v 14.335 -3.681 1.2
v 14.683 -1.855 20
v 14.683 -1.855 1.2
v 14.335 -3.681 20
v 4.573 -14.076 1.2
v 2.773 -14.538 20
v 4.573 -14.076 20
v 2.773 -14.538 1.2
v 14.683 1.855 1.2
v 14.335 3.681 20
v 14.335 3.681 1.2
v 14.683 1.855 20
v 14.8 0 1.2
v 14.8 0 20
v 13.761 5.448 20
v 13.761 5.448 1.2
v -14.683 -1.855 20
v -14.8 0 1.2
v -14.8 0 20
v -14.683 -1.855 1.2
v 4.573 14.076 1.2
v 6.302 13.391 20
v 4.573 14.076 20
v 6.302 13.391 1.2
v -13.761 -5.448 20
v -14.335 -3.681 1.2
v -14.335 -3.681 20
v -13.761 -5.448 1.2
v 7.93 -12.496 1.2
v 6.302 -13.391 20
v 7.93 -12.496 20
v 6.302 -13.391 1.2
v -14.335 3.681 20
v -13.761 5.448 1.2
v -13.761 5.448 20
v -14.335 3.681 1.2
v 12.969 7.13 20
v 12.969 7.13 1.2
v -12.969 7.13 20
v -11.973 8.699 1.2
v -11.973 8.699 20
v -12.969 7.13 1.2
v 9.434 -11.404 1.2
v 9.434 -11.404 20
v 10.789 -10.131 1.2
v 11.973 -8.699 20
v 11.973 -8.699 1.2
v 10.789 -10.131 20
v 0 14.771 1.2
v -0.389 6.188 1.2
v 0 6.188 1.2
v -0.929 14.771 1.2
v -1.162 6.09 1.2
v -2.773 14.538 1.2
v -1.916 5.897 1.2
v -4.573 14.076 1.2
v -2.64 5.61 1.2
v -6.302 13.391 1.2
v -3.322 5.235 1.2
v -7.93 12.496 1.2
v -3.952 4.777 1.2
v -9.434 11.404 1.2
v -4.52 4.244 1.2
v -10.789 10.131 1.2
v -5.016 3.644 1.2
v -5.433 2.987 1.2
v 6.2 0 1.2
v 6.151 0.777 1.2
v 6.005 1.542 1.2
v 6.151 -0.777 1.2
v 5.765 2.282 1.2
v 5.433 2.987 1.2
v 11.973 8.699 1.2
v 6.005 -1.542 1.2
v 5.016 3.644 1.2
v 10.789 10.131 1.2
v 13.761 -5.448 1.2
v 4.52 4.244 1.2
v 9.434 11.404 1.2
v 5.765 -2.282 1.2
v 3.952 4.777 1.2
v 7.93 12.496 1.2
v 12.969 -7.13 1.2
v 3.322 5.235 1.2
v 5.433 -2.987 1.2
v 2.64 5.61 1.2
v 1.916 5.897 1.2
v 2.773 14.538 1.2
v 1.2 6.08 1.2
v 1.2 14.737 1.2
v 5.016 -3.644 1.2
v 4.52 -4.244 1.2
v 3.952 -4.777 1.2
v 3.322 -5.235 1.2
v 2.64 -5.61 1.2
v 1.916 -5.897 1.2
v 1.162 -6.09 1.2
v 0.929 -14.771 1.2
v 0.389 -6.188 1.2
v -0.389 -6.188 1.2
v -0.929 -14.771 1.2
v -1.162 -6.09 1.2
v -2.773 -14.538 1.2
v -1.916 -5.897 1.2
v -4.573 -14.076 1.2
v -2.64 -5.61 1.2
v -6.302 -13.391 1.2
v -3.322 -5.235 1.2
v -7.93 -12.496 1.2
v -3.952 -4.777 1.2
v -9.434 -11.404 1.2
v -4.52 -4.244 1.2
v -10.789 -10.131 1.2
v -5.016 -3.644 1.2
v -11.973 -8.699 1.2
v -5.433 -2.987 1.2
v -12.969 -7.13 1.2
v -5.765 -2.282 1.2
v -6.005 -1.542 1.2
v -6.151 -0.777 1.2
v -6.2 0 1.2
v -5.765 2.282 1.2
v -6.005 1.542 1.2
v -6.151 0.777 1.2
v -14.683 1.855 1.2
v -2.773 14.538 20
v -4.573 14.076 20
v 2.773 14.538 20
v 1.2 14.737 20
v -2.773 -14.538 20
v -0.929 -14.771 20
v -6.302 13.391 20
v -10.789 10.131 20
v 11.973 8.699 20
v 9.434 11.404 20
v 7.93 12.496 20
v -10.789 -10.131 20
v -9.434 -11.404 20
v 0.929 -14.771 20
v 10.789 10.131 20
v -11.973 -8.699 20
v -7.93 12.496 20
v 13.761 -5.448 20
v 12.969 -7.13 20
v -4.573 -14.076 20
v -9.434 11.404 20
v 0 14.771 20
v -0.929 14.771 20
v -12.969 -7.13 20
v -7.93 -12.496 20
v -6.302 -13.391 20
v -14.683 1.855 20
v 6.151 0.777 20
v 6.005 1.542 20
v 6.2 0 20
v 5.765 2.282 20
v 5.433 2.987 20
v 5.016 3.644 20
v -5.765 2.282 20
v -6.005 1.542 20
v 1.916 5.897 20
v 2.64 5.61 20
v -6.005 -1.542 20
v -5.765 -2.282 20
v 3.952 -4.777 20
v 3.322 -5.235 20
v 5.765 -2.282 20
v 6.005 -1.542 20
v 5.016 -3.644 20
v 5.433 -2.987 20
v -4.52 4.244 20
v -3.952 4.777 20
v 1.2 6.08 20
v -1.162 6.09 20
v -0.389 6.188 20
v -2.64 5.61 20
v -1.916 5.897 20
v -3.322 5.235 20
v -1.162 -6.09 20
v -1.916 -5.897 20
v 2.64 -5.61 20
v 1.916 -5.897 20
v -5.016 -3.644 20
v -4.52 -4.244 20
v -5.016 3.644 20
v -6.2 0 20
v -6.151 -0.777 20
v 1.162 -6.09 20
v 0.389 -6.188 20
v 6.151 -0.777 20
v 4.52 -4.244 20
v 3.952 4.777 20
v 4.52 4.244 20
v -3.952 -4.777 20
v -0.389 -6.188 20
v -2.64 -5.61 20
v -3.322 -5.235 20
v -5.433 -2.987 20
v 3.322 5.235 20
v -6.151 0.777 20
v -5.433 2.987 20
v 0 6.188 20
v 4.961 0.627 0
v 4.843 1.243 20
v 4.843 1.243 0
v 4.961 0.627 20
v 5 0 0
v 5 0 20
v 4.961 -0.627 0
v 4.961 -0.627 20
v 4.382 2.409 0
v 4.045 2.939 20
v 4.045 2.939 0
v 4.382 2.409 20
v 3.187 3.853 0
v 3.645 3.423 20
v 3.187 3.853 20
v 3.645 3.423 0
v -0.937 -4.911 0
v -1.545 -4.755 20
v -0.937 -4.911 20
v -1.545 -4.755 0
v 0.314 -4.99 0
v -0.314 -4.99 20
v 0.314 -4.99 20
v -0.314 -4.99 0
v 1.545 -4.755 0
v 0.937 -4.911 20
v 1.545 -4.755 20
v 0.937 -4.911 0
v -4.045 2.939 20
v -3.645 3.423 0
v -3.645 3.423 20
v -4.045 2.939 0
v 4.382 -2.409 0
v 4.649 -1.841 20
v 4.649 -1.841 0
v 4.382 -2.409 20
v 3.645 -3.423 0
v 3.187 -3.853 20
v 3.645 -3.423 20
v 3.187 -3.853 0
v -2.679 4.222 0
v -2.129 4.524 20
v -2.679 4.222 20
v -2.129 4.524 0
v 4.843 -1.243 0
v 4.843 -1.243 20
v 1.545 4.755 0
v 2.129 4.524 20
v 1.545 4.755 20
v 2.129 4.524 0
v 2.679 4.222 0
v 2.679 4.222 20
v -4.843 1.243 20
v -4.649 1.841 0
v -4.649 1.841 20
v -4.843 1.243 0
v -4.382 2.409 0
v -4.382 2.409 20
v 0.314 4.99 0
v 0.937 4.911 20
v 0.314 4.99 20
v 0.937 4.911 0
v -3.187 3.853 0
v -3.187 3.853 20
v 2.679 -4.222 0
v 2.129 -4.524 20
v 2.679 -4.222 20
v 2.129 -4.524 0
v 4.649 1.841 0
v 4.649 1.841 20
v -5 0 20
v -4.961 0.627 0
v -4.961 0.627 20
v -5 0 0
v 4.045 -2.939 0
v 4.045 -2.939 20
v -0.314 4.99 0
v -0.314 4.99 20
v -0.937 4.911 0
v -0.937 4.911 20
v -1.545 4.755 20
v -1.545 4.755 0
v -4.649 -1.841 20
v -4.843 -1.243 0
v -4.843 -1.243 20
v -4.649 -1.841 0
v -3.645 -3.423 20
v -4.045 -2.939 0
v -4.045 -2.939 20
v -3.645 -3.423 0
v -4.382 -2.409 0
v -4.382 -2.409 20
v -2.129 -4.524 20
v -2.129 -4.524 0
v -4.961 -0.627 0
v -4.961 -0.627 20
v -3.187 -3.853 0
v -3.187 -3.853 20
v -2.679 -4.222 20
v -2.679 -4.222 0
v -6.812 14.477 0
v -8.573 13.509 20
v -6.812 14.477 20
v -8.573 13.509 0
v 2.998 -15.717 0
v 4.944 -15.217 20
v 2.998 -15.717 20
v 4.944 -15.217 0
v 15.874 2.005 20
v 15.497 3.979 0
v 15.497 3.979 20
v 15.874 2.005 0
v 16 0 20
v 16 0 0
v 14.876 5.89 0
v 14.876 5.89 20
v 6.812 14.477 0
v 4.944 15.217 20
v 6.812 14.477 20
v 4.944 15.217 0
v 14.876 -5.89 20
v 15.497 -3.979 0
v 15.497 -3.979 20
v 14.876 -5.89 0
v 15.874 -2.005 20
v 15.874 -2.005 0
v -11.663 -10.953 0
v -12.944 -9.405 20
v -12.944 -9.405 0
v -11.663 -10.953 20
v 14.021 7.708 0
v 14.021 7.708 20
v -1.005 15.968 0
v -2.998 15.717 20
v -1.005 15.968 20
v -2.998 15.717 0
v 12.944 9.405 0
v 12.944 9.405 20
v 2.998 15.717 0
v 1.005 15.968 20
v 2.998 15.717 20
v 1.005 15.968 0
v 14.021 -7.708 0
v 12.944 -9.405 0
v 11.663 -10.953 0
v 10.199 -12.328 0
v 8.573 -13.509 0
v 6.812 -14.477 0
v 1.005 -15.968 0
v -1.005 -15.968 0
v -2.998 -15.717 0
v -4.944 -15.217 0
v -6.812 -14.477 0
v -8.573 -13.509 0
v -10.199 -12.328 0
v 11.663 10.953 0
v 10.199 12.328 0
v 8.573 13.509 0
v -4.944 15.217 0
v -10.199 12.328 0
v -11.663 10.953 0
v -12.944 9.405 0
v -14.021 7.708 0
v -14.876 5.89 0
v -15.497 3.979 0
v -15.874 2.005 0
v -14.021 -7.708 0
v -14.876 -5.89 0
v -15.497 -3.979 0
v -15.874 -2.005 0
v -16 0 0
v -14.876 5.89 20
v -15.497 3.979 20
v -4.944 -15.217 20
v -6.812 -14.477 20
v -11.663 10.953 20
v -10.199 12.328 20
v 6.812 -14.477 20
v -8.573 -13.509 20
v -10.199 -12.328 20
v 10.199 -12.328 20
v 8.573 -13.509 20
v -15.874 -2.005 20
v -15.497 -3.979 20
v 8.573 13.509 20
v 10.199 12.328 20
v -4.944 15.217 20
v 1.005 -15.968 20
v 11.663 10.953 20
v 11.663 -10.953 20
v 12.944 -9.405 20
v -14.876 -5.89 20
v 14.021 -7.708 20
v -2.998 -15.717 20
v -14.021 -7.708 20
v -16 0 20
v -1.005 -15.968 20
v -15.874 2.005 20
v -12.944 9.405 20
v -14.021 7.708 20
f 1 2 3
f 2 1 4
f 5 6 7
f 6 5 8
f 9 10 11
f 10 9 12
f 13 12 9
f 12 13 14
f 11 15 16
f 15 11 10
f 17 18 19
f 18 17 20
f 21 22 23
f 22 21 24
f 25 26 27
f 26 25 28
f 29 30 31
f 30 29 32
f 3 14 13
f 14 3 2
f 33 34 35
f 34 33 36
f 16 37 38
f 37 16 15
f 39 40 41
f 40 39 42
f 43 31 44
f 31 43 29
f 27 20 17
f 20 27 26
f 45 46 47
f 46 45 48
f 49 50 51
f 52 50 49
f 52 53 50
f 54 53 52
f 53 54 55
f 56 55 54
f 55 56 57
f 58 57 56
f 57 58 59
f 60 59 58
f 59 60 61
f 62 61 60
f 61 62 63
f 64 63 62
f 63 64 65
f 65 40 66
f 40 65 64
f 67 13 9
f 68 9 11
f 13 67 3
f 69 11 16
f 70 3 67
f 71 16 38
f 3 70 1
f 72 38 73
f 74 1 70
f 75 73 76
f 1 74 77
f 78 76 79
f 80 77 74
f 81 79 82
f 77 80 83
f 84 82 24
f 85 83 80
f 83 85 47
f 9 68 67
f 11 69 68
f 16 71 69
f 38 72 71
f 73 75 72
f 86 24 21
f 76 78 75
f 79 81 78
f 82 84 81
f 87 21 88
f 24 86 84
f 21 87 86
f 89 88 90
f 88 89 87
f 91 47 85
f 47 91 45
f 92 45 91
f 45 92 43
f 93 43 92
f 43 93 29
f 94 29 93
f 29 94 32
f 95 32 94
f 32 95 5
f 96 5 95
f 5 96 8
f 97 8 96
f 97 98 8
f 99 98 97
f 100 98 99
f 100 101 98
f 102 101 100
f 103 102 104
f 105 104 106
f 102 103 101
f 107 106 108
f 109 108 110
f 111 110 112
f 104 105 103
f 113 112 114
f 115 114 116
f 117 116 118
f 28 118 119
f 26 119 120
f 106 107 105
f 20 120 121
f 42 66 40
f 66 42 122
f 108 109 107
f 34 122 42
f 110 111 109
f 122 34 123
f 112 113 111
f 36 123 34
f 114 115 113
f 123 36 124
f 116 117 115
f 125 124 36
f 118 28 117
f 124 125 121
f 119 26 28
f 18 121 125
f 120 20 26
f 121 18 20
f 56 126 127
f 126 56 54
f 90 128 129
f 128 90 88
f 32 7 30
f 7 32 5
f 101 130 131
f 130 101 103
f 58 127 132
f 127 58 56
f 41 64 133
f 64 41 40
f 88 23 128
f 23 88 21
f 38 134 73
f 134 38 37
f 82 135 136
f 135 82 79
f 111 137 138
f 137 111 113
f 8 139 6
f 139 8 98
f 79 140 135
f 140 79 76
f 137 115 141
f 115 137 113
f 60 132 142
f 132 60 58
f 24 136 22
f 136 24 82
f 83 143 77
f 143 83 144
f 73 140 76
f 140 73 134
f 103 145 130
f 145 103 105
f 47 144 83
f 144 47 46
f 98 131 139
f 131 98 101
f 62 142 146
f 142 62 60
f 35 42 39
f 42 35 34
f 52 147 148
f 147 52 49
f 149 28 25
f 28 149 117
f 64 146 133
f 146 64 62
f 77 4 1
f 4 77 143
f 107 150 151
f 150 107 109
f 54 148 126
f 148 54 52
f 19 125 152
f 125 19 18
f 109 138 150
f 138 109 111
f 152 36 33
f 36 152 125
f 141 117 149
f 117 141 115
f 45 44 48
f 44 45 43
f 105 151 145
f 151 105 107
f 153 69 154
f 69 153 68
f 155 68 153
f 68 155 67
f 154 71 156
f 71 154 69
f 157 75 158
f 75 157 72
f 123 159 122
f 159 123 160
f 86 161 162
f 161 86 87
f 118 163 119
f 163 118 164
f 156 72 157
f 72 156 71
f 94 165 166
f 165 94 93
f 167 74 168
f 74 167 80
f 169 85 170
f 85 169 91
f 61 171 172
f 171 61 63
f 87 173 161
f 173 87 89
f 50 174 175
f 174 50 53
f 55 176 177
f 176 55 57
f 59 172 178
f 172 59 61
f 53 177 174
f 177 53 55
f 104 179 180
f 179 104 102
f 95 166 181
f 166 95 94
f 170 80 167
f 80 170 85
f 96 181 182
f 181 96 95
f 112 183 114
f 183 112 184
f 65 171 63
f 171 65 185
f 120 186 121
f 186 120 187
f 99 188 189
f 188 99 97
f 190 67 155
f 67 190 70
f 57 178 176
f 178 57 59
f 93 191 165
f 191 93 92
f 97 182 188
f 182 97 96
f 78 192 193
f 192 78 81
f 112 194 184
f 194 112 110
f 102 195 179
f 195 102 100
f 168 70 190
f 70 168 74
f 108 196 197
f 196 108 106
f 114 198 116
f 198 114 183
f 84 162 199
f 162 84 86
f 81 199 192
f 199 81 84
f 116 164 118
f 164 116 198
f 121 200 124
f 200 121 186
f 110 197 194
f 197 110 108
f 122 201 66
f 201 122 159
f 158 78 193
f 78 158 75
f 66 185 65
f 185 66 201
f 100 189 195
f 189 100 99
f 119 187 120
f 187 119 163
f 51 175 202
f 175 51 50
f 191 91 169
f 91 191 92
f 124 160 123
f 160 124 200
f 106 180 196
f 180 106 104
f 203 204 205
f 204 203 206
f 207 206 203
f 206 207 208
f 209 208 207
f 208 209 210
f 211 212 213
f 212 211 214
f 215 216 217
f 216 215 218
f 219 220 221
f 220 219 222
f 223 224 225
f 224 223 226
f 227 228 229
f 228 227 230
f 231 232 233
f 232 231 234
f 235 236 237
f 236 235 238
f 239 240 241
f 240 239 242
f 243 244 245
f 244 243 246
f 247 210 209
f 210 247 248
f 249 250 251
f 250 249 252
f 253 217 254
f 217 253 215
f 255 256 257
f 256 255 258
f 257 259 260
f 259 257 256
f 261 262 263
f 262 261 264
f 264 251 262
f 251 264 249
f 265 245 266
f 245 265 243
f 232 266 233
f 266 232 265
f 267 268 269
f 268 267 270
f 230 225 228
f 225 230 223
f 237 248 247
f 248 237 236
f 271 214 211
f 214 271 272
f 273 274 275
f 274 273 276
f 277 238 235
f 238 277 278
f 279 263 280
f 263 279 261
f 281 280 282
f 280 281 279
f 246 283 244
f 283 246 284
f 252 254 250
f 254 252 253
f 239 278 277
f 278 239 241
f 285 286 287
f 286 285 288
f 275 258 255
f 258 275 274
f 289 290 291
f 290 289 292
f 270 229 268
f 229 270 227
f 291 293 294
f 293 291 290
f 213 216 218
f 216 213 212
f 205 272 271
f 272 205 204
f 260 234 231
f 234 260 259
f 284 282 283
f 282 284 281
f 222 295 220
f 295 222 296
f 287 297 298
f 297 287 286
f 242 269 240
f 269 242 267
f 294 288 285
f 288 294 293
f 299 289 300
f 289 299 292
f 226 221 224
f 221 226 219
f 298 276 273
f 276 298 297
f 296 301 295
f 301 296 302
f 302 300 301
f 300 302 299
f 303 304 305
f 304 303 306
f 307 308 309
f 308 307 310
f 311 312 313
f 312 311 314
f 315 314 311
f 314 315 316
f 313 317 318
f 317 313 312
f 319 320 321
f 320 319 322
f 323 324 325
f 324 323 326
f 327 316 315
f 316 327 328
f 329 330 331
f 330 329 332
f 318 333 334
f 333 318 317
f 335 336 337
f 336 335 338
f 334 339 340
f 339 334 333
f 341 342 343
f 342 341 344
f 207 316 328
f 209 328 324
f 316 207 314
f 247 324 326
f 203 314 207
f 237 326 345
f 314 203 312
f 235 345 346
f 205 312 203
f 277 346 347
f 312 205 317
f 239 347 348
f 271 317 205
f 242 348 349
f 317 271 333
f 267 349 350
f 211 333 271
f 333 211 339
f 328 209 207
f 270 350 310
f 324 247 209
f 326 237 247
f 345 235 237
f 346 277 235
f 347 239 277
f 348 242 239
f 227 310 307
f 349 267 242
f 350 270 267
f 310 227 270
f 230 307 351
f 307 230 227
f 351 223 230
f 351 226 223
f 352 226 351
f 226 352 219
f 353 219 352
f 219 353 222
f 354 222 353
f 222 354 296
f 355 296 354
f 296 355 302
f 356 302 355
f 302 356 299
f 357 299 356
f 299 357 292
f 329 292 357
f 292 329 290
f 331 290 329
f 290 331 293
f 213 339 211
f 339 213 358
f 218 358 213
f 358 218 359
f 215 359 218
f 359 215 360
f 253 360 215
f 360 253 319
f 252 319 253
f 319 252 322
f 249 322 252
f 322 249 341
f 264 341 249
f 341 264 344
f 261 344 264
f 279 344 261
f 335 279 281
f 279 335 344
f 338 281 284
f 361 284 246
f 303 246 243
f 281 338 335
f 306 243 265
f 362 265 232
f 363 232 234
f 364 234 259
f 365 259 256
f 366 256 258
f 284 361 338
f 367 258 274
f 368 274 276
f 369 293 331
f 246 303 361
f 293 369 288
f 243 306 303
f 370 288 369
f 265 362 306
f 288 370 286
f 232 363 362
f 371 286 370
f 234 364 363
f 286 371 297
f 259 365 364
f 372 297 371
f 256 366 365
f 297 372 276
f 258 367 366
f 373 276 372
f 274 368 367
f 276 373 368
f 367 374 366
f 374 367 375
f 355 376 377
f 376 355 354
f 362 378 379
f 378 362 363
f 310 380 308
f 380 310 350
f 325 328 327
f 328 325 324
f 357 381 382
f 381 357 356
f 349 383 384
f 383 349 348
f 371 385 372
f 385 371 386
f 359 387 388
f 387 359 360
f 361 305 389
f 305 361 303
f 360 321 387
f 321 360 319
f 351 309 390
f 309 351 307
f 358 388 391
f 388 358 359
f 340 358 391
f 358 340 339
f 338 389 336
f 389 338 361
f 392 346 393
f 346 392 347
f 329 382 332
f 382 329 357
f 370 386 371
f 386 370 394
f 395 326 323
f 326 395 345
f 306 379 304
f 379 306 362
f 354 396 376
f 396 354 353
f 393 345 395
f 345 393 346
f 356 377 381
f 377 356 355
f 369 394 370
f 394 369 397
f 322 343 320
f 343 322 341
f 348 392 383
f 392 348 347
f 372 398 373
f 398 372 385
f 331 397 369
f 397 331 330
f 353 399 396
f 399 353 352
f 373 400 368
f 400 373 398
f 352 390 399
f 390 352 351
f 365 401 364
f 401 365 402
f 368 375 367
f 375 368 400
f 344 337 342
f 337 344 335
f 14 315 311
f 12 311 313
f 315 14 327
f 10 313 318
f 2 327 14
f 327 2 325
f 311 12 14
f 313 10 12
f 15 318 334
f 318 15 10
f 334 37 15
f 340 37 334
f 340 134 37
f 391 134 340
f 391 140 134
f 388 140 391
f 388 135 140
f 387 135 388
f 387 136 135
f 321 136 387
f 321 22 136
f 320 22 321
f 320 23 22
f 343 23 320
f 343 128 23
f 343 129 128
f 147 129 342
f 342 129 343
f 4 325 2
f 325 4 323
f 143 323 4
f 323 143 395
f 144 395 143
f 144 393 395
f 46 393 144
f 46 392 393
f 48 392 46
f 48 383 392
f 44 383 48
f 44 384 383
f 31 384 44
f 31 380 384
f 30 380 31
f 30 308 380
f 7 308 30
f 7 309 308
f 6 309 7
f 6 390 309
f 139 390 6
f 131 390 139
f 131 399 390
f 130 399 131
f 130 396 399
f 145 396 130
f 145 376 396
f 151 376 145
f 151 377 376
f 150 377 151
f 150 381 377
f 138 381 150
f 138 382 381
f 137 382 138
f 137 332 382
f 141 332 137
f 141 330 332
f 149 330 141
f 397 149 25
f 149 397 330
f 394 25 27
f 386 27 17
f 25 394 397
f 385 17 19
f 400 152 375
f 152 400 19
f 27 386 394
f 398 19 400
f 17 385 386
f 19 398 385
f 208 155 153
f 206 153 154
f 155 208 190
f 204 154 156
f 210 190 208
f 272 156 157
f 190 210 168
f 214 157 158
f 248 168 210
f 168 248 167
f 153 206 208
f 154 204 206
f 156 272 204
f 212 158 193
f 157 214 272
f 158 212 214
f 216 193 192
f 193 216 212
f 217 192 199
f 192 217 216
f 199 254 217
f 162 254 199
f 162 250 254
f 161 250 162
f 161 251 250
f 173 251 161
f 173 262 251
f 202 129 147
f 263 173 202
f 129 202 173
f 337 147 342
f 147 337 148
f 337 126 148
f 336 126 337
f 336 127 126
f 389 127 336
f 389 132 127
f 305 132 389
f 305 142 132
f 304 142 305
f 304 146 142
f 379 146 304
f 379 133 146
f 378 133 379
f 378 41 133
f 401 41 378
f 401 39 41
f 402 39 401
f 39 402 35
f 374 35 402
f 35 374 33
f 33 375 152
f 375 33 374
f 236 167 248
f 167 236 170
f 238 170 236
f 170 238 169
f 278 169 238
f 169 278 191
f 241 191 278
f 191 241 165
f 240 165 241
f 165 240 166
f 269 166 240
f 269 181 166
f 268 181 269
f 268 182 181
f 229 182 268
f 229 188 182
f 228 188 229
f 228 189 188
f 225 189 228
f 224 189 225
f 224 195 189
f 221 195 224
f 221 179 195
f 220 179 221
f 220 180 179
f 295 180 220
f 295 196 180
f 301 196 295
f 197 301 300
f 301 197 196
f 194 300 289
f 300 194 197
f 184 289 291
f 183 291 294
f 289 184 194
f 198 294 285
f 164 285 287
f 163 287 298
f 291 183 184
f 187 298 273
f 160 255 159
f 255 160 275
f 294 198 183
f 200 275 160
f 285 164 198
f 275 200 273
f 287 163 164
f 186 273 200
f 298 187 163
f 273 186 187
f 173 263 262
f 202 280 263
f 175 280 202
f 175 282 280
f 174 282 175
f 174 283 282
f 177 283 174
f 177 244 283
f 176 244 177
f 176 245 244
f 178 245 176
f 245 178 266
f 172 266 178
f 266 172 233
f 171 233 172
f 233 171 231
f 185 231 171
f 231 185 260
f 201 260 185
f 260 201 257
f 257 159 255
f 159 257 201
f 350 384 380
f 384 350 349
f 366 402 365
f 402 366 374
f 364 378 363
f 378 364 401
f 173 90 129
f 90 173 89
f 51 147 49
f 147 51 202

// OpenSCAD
// in mm
spacer_radius = 16;
// in mm
spacer_height = 20;
// in mm
hole_radius = 5;
// in mm
wall_thickness = 1.2;
// level of detail
$fn = 50;

difference(){
    cylinder(r=spacer_radius, h=spacer_height);
    
    union(){
        translate([0, 0, wall_thickness])
        difference(){
            cylinder(r=spacer_radius-wall_thickness, h=spacer_height+0.1);
            cylinder(r=hole_radius+wall_thickness, h=spacer_height+0.2);
        }
        translate([0, 0, -0.01])
        cylinder(r=hole_radius, h=spacer_height+0.1);
    }
}

translate([0, hole_radius + wall_thickness/2, 0])
cube([wall_thickness, spacer_radius - hole_radius - wall_thickness, spacer_height]);
